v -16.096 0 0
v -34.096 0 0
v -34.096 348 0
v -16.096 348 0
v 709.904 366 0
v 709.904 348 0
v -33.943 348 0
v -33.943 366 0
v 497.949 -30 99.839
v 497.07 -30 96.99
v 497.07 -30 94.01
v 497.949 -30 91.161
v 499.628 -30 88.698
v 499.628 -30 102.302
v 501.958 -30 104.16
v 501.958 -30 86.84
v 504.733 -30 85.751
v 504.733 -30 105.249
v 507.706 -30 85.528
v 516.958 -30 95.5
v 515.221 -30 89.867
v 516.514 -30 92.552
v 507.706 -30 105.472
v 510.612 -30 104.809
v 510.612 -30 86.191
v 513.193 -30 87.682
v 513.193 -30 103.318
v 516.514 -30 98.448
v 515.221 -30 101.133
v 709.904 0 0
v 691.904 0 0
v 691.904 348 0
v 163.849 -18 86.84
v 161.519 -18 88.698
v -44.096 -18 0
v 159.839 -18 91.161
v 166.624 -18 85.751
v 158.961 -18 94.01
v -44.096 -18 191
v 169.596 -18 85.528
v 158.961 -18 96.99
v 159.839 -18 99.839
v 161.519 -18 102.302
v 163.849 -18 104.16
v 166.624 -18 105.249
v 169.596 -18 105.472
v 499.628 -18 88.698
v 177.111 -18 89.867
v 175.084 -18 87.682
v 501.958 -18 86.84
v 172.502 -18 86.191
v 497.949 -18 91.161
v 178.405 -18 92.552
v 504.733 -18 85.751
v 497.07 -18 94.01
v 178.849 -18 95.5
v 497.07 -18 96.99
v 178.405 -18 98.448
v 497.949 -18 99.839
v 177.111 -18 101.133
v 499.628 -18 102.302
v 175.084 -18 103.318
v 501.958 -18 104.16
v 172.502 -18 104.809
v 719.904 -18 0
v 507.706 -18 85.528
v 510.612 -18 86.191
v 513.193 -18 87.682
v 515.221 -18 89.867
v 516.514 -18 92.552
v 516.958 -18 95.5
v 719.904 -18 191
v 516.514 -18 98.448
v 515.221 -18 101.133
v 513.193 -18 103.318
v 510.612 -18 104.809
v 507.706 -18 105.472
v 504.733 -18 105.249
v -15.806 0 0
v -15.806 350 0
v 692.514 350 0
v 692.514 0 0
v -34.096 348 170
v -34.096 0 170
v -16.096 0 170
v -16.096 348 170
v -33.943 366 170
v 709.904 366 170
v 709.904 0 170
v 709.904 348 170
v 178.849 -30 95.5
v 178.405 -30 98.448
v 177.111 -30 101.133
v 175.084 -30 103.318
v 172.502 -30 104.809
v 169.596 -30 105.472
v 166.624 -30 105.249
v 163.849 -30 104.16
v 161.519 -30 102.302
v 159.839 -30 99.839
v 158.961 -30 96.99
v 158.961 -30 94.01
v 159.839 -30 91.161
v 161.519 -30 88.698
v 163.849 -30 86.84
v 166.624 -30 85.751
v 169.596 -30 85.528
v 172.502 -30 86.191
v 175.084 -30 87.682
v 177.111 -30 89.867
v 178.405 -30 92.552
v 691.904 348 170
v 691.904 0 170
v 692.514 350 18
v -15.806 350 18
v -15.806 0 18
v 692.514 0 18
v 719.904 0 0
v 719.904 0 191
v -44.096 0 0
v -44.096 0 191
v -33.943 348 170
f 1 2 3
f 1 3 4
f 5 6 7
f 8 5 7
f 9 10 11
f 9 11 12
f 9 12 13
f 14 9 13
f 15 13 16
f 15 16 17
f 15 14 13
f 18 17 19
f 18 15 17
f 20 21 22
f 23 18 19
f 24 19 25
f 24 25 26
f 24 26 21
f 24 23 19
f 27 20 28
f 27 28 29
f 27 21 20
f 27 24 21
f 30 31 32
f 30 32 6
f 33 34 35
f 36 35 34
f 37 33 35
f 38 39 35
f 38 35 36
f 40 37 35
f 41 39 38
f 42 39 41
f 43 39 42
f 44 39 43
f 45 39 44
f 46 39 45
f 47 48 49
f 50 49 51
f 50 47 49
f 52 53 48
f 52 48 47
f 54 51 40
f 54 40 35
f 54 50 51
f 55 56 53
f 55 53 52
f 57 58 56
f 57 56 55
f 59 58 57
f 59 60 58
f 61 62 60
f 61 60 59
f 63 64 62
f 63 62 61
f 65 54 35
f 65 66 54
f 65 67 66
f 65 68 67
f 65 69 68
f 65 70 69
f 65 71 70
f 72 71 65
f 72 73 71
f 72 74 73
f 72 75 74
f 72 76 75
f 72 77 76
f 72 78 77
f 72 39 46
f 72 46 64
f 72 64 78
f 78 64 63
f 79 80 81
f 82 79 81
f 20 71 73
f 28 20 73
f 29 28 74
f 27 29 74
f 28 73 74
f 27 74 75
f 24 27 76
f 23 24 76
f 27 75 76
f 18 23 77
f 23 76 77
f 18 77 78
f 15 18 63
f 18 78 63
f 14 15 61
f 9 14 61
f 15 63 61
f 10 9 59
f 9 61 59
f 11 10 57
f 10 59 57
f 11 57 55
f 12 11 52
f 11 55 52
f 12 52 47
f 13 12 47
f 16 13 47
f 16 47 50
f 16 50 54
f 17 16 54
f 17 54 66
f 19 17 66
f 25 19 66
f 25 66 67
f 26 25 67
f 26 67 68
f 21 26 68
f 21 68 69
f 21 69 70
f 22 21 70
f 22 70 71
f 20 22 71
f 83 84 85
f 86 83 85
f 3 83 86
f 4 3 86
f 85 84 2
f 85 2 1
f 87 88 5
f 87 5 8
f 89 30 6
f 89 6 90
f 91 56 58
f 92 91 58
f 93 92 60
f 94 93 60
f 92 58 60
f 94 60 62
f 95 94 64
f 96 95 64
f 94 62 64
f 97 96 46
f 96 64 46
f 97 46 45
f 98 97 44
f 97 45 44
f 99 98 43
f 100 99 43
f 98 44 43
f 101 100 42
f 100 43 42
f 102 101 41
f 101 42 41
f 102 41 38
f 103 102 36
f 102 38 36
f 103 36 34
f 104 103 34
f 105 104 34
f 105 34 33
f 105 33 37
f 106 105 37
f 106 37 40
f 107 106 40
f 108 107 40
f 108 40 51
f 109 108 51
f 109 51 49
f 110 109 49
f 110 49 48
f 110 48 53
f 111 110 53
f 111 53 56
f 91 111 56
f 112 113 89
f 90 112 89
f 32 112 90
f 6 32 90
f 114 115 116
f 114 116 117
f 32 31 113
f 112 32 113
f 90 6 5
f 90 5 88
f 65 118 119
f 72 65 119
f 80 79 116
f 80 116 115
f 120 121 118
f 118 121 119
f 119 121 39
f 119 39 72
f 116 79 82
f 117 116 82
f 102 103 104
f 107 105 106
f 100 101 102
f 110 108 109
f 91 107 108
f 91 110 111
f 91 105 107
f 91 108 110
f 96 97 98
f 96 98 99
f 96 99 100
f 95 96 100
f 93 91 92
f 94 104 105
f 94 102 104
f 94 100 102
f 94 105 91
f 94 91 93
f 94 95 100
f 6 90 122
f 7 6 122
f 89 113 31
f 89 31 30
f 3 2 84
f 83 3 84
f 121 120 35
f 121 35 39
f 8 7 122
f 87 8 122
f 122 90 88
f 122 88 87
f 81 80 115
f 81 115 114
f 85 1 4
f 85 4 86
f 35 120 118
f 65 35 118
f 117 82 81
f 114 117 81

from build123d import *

# Parameters (mm, degrees)
F0_W     = 764
F0_H     = 191
F0_R     = 10
F1_DEPTH = 18
F2_DEPTH = 30
F3_W     = 18
F3_H     = 170
F4_DEPTH = 348
F5_W     = 743.8469
F5_H     = 170
F6_DEPTH = 18
F7_W     = 708.32
F7_H     = 350
F8_DEPTH = 18


with BuildPart() as f1:
    # F0 (on Front) → F1 (new body)
    with BuildSketch(Plane.XZ):
        with Locations((337.903664, 95.5)):
            Rectangle(F0_W, F0_H)
        with Locations((168.849051, 95.5)):
            Circle(F0_R, mode=Mode.SUBTRACT)
        with Locations((506.958277, 95.5)):
            Circle(F0_R, mode=Mode.SUBTRACT)
    extrude(amount=F1_DEPTH)

    # F0 (on Front) → F2 (join)
    with BuildSketch(Plane.XZ):
        with Locations((168.849051, 95.5)):
            Circle(F0_R)
        with Locations((506.958277, 95.5)):
            Circle(F0_R)
    extrude(amount=F2_DEPTH)


with BuildPart() as f4:
    # F3 (on Front) → F4 (new body)
    with BuildSketch(Plane.XZ):
        with Locations((-25.096336, 85)):
            Rectangle(F3_W, F3_H)
        with Locations((700.903664, 85)):
            Rectangle(F3_W, F3_H)
    extrude(amount=-F4_DEPTH)


with BuildPart() as f6:
    # F5 (on face) → F6 (new body)
    with BuildSketch(Plane(origin=(0, 348, 0), x_dir=(-1, 0, 0), z_dir=(0, 1, 0))):
        with Locations((-337.980214, 85)):
            Rectangle(F5_W, F5_H)
    extrude(amount=F6_DEPTH)


with BuildPart() as f8:
    # F7 (on Top) → F8 (new body)
    with BuildSketch(Plane.XY):
        with Locations((338.353519, 175)):
            Rectangle(F7_W, F7_H)
    extrude(amount=F8_DEPTH)


solid = Compound([f1.part, f4.part, f6.part, f8.part])
